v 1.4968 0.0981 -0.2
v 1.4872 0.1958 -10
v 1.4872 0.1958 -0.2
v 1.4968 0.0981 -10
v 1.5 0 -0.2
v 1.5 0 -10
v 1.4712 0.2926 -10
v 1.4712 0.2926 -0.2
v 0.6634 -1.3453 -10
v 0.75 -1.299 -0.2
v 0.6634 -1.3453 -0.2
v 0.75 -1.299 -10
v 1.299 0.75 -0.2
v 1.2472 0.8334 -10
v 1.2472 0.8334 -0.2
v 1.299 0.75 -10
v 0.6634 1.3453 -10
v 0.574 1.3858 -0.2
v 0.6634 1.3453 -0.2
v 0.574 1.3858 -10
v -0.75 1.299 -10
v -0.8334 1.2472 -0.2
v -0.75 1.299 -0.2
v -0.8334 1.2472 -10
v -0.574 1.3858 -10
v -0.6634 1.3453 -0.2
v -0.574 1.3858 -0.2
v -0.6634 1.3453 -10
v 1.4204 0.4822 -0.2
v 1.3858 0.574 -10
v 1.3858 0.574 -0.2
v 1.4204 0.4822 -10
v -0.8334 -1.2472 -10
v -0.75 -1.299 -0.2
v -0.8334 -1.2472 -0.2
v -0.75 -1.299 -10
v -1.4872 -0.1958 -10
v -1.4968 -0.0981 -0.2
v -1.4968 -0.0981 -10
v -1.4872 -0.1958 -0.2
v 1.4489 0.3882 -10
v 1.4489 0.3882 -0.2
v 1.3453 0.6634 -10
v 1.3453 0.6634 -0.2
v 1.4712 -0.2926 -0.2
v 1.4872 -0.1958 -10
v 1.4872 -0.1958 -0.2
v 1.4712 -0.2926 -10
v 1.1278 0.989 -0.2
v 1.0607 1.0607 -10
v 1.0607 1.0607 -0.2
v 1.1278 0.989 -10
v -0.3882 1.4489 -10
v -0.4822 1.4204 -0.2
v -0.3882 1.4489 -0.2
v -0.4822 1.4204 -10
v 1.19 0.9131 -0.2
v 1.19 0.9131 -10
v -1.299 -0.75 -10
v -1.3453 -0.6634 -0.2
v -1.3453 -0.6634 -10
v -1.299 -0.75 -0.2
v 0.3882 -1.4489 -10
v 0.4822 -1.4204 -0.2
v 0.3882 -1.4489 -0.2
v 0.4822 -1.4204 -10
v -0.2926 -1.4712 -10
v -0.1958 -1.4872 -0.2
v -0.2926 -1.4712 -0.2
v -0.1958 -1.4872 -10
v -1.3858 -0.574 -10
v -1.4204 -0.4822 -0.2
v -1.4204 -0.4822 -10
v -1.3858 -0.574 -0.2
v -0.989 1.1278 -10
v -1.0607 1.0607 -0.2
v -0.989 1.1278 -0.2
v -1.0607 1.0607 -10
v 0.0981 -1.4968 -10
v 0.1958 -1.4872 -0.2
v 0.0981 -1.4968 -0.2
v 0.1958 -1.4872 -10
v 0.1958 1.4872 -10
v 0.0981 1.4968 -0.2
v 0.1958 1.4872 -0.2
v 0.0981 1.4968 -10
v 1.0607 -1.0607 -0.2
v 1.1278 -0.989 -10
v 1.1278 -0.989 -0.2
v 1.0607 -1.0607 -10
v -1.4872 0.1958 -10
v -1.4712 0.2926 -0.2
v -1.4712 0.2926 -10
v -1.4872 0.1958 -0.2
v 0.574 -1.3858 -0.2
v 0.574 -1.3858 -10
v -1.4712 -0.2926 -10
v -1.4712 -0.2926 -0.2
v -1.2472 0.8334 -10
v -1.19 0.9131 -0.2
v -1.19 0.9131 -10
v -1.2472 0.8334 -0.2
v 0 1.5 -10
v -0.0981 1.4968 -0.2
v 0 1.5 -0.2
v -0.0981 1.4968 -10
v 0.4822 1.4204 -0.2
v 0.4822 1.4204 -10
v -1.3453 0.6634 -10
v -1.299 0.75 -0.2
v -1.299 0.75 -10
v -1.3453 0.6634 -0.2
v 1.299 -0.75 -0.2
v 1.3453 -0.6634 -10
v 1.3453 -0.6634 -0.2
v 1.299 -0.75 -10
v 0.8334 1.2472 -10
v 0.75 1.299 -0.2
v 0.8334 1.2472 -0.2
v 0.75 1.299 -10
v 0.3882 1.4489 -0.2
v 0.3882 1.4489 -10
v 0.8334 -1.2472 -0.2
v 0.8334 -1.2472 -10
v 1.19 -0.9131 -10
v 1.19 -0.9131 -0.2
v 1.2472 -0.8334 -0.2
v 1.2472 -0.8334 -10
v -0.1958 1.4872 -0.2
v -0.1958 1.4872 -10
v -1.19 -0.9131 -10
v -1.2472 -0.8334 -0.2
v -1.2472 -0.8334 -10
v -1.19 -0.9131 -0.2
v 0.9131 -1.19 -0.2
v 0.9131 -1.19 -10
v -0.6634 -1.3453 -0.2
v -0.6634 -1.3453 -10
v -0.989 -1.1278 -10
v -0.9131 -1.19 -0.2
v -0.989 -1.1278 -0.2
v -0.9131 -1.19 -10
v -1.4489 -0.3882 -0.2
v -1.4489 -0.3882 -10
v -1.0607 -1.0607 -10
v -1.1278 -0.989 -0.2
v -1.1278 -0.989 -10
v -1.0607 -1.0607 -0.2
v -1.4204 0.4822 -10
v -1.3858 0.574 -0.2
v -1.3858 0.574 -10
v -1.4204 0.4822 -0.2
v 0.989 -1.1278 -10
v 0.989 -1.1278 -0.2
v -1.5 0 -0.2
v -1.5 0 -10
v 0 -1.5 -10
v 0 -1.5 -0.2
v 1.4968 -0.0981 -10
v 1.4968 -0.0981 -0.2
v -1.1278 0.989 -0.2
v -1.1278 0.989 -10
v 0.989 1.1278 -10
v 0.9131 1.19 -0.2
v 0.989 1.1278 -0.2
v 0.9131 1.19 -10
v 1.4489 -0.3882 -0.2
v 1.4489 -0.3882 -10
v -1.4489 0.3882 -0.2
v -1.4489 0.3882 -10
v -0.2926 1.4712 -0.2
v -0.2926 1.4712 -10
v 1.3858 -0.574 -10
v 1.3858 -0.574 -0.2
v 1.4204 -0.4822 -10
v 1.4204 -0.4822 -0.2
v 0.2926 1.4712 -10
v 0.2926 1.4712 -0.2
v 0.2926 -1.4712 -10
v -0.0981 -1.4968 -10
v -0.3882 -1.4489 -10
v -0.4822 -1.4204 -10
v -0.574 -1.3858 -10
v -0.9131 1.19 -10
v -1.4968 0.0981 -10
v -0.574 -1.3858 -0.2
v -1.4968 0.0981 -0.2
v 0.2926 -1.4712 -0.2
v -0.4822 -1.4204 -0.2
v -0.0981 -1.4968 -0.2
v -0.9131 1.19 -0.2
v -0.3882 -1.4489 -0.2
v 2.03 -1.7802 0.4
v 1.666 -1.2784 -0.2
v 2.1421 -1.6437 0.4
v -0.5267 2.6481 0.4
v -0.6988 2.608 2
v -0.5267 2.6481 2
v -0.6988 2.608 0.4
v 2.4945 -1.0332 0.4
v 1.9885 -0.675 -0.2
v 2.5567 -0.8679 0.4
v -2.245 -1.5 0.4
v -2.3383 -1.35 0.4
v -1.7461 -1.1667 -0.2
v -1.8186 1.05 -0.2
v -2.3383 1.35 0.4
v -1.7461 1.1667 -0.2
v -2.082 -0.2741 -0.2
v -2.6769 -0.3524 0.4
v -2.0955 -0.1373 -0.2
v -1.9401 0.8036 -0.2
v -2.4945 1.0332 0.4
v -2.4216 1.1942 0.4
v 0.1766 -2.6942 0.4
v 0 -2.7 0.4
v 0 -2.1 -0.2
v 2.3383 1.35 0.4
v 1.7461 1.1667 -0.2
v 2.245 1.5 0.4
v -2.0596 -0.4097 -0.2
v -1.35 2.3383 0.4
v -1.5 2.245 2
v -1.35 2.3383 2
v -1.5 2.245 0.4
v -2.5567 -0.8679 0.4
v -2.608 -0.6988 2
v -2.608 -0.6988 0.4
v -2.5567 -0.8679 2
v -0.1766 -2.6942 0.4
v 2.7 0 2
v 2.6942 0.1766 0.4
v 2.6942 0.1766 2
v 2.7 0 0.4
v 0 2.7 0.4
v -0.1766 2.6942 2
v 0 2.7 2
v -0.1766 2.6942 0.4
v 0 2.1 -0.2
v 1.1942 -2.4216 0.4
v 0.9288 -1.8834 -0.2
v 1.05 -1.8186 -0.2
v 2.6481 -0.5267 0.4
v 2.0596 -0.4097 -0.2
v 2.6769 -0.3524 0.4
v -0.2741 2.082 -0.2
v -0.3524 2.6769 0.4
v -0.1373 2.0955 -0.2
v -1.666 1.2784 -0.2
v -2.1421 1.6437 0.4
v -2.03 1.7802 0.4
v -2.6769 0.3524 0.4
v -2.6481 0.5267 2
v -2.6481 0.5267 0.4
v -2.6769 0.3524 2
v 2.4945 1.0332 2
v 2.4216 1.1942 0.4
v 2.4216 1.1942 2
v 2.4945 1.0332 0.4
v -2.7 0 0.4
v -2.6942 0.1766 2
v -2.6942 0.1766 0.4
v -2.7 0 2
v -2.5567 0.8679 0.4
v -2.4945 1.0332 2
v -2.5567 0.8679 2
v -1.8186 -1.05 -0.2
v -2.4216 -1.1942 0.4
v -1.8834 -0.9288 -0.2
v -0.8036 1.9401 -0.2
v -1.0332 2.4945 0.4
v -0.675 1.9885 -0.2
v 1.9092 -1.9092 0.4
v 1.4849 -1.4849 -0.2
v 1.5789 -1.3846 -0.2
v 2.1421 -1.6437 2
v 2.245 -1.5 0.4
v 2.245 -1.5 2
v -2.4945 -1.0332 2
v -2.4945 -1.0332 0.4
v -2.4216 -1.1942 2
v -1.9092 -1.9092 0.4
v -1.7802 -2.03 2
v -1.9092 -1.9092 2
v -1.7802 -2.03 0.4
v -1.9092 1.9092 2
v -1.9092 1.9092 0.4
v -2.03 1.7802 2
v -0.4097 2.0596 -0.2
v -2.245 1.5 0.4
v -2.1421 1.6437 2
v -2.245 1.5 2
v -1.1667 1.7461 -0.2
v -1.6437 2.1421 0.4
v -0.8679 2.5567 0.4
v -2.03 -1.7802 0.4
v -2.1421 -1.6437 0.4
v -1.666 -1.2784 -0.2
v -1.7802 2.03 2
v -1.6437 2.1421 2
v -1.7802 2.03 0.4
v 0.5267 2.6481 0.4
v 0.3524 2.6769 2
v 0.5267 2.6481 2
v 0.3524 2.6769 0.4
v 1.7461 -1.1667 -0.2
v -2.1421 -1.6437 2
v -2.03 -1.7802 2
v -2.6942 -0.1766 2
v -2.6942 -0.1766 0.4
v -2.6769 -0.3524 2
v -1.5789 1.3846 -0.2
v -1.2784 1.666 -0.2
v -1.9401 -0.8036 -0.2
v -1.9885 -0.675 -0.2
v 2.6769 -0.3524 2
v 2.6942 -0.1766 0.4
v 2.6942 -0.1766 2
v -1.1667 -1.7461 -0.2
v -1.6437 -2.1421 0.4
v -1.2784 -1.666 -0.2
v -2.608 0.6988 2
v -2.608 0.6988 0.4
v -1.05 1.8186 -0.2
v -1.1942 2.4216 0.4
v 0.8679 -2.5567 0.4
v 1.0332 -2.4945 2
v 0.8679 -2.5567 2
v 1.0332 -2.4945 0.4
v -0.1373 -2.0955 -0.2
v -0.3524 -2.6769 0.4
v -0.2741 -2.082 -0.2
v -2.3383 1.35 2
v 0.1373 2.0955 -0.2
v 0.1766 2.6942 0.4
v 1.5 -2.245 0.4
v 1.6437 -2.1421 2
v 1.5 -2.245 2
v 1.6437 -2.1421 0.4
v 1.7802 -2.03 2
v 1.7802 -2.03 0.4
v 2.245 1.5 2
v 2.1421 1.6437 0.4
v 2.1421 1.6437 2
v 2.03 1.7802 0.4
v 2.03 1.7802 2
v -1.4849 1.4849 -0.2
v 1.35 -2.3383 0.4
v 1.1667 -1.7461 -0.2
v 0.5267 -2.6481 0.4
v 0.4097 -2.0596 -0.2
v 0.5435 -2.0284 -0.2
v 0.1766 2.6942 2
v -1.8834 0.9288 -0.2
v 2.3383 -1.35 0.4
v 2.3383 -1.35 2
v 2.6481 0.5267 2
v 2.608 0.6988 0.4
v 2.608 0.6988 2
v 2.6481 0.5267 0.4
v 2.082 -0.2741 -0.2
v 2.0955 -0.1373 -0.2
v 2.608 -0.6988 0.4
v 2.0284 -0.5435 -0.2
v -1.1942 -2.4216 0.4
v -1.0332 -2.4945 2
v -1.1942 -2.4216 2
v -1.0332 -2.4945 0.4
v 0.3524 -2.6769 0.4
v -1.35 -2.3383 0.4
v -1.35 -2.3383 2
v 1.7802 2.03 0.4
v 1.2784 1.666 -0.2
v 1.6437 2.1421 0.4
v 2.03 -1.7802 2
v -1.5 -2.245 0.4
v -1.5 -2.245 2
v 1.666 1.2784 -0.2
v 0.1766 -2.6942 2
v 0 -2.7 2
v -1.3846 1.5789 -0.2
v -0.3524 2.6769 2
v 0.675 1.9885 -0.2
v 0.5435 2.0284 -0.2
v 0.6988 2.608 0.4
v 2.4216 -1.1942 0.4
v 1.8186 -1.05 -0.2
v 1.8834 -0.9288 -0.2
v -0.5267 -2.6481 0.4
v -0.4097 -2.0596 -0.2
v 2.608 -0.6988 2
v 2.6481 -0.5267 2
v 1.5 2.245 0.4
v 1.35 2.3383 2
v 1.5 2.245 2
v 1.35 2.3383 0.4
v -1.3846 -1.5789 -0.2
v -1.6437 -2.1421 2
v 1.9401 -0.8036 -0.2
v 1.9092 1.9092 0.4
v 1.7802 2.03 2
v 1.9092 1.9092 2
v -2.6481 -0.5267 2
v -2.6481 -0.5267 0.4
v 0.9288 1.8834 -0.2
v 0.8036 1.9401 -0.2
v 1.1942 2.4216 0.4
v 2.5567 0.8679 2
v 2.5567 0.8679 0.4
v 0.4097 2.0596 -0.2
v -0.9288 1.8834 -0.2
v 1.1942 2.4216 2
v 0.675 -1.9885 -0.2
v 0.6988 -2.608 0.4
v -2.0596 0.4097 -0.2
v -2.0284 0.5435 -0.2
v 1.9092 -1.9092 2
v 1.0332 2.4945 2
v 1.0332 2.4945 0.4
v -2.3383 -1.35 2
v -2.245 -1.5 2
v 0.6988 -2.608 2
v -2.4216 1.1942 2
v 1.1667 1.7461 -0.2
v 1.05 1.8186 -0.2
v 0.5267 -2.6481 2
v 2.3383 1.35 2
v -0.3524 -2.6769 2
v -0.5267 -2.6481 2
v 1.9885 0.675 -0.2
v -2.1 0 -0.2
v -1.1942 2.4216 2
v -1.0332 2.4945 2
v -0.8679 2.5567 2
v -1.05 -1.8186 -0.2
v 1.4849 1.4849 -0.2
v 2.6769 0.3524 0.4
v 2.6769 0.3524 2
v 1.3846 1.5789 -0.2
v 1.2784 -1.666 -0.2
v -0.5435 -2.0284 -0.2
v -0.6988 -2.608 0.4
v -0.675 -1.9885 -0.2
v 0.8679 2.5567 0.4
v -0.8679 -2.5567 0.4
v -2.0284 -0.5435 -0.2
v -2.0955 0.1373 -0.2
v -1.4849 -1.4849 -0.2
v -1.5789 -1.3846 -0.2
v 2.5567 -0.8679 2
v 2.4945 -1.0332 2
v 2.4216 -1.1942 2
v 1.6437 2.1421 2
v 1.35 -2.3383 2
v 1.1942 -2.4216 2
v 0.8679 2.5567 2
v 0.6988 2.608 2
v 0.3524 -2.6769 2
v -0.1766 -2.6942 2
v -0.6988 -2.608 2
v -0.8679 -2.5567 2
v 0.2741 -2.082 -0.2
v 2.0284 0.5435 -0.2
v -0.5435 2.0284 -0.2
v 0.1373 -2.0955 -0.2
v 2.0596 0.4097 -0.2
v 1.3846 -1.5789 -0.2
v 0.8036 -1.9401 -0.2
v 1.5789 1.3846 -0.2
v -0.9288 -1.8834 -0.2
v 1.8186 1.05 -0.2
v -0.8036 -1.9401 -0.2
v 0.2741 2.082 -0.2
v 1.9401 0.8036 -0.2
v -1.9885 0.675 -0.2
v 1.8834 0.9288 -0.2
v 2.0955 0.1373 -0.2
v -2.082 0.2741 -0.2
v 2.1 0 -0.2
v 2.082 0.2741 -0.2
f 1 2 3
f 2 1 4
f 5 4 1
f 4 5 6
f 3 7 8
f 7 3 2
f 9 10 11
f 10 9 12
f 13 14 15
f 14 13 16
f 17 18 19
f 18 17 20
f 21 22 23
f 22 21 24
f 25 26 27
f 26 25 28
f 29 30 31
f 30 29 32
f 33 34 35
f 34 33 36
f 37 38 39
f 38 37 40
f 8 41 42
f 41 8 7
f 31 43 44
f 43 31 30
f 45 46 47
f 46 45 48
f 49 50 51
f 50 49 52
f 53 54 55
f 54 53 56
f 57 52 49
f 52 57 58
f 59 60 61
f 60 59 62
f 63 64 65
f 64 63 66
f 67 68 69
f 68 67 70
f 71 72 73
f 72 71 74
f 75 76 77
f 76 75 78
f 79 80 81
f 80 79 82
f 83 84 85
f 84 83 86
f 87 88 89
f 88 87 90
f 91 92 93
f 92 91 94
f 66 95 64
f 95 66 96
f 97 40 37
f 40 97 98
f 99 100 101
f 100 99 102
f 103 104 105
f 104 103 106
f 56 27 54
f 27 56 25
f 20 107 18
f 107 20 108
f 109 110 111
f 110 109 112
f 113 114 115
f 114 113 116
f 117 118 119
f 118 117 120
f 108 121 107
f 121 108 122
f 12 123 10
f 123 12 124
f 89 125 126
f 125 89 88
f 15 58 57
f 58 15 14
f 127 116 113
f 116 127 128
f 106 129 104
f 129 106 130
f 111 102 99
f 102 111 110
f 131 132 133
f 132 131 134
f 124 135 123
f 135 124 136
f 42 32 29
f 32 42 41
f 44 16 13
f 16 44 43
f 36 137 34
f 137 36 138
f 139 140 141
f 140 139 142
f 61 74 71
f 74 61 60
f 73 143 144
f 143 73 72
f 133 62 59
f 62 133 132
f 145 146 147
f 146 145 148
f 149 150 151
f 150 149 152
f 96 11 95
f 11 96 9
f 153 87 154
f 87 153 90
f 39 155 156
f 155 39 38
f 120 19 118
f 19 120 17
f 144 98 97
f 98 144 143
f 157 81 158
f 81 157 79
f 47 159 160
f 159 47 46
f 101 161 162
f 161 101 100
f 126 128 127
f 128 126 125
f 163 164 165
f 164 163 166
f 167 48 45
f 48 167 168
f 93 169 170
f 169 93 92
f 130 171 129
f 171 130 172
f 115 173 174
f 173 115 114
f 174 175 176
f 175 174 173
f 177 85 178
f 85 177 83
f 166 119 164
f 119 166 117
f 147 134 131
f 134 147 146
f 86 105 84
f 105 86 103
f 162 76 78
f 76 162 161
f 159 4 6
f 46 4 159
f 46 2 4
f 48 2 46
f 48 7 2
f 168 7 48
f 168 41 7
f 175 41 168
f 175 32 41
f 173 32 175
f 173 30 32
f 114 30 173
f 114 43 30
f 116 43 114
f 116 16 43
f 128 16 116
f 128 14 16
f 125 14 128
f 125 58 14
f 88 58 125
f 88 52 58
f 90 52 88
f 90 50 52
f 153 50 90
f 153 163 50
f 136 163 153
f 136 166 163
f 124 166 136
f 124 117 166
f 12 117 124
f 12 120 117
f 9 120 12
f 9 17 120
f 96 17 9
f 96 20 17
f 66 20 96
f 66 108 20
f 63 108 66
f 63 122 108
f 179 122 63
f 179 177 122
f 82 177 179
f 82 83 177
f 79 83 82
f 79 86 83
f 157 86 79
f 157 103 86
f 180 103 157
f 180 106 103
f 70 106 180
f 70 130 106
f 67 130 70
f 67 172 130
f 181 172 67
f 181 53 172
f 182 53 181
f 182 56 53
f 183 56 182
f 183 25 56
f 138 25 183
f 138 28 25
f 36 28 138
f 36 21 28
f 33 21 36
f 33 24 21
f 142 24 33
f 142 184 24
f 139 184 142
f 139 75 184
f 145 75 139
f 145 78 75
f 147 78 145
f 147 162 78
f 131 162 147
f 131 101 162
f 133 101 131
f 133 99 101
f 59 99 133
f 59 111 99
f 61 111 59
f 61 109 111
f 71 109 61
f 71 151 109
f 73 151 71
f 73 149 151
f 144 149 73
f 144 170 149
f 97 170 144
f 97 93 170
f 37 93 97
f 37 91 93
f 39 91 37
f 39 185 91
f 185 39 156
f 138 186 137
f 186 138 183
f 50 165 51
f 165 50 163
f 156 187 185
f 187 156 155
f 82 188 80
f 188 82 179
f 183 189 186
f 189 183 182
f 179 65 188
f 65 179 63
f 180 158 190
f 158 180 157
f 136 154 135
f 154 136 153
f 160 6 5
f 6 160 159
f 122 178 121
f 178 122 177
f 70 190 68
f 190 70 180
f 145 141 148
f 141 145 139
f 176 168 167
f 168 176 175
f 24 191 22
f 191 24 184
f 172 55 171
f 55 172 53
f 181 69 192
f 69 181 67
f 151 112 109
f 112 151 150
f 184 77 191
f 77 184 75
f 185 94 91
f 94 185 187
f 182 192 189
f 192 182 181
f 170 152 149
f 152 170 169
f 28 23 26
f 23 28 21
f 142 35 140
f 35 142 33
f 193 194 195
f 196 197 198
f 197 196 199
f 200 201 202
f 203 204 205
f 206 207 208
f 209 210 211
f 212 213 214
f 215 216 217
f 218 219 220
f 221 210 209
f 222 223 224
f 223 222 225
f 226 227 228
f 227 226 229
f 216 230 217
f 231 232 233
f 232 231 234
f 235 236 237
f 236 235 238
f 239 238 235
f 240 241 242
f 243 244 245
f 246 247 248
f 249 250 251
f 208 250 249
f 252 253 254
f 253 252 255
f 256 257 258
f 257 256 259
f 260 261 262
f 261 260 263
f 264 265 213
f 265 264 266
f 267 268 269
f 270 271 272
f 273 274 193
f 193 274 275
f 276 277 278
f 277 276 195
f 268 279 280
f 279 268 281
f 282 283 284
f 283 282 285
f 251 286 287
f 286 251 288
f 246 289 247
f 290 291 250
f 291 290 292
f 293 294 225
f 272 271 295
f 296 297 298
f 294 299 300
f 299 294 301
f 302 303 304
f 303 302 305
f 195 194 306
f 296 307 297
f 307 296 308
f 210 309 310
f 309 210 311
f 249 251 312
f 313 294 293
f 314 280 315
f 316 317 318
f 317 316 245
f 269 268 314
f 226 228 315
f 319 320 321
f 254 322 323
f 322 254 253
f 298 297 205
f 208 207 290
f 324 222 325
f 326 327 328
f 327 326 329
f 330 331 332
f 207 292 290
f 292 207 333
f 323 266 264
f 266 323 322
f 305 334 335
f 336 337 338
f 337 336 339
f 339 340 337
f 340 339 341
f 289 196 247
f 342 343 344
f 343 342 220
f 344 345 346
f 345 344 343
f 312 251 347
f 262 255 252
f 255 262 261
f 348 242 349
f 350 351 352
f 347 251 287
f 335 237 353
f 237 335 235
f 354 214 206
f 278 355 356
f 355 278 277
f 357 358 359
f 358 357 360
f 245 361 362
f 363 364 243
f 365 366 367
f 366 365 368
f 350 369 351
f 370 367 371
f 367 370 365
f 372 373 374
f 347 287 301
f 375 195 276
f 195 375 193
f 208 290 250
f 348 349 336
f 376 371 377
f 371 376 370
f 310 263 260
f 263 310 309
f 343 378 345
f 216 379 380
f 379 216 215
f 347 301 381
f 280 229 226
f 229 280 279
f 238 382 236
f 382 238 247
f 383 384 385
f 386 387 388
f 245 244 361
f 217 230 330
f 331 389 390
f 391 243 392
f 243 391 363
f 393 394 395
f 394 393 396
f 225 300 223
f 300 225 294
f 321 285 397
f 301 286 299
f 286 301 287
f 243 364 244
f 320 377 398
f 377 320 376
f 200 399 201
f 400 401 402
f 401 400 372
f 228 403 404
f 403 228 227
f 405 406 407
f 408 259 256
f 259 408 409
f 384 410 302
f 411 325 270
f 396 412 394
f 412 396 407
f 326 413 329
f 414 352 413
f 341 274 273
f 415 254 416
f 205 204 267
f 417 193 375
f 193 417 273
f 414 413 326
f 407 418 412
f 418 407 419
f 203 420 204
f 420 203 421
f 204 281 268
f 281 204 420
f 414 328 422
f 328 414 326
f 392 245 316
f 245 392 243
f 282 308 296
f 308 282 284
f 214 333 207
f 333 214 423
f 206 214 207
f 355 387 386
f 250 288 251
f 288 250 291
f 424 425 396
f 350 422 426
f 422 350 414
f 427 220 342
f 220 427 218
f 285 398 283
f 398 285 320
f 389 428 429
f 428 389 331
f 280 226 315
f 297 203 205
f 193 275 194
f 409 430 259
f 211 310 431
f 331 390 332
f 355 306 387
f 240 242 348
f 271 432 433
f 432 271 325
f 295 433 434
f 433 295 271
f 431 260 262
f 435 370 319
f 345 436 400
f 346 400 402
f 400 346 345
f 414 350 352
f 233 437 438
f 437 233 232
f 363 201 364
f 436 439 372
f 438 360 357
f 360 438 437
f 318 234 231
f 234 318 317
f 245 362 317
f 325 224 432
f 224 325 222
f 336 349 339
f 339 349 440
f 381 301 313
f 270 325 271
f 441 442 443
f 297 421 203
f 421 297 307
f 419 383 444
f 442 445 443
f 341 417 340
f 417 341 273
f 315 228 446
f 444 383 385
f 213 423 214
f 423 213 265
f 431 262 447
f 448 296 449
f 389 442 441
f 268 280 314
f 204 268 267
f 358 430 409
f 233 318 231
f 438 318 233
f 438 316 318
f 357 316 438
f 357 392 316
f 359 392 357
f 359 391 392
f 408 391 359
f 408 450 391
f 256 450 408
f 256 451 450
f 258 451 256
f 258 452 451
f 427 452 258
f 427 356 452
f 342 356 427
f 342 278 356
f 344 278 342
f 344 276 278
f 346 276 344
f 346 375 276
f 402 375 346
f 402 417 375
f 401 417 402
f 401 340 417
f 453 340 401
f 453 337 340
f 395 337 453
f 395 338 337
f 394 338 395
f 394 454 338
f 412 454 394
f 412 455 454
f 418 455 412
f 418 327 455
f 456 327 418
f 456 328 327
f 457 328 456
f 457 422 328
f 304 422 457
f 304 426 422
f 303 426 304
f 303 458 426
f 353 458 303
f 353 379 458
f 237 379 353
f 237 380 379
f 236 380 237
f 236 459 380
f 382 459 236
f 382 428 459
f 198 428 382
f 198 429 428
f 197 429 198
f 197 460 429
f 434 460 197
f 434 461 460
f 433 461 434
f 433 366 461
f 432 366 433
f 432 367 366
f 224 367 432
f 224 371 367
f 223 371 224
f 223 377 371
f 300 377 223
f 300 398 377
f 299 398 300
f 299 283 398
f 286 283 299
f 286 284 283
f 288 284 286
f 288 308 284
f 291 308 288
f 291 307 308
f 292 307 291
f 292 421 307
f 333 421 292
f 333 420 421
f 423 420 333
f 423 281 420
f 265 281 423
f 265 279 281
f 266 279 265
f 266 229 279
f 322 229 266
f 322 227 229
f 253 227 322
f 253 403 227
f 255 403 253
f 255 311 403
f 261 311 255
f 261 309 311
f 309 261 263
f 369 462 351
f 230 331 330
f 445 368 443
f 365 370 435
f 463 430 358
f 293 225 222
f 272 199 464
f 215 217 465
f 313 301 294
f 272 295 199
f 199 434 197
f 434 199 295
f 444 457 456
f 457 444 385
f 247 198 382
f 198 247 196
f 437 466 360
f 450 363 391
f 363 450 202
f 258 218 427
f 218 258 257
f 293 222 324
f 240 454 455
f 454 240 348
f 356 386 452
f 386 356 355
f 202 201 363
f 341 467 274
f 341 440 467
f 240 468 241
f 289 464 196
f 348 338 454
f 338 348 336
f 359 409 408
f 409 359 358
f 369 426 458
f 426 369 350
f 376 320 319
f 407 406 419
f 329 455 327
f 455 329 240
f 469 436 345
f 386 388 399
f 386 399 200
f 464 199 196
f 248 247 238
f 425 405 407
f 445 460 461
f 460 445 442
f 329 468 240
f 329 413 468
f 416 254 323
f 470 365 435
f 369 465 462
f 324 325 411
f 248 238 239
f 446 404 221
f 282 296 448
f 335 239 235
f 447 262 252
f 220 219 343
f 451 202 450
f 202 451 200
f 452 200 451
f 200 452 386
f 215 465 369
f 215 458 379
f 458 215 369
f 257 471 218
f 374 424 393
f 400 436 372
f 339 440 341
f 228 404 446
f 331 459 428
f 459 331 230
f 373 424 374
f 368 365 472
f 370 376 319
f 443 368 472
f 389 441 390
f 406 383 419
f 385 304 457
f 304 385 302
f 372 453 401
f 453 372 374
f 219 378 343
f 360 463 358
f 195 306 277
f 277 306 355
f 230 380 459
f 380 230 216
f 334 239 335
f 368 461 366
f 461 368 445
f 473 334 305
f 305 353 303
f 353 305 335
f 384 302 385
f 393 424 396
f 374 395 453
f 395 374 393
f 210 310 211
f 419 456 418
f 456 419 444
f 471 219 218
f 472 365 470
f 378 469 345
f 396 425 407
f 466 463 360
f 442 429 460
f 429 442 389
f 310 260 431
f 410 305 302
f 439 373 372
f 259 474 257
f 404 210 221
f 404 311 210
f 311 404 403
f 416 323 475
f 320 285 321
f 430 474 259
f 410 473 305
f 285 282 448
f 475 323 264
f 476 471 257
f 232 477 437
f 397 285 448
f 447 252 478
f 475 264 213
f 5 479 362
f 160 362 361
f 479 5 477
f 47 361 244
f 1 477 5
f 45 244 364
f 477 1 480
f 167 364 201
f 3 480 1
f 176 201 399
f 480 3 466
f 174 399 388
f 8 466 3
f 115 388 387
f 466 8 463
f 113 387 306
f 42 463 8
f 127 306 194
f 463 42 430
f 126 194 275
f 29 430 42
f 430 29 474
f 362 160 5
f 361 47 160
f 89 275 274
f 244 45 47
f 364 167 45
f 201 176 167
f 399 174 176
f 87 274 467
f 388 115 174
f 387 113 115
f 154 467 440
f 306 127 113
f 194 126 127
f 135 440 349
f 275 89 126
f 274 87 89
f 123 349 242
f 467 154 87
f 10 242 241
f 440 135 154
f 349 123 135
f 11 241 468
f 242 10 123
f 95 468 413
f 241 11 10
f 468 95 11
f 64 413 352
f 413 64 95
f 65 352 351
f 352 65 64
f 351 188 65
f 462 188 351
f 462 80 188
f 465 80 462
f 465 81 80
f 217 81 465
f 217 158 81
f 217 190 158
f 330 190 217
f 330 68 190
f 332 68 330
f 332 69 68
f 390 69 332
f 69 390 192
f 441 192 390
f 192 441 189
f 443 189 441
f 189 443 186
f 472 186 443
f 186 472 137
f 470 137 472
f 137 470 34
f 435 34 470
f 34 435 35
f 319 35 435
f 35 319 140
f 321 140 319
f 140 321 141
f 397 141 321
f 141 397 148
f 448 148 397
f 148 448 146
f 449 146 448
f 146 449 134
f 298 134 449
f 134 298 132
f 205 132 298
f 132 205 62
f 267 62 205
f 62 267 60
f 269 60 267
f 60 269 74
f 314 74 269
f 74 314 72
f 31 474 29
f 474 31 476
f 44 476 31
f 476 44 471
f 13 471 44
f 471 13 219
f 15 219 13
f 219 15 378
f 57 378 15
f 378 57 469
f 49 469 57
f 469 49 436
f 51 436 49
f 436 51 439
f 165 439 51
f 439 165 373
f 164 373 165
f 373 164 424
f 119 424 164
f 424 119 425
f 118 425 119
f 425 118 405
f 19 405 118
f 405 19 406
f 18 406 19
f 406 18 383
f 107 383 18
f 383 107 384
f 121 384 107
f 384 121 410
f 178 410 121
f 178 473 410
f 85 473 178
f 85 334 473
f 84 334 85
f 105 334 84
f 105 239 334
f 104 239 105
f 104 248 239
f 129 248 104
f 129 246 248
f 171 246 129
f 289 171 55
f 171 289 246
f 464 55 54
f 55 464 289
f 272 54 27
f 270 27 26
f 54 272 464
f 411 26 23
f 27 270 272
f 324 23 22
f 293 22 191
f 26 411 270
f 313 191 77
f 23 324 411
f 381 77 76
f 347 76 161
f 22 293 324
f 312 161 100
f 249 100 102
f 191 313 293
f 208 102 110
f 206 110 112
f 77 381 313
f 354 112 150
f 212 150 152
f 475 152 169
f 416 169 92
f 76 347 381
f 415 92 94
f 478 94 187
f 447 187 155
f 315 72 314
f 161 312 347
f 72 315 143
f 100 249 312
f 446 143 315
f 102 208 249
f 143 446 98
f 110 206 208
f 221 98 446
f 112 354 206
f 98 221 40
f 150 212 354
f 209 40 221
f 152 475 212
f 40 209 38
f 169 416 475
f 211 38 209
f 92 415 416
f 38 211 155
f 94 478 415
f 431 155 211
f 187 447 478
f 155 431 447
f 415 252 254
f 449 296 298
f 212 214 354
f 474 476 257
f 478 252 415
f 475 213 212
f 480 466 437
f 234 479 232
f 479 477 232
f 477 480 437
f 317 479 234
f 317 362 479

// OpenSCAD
// M3x10 Pan Head Screw (single connected solid)

// Parameters (mm)
shaft_diameter_mm = 3.0;   // shank diameter
length_mm         = 10.0;  // under-head length
head_diameter_mm  = 5.4;   // head max diameter
head_height_mm    = 2.0;   // head height
overlap_mm        = 0.2;   // small overlap to guarantee watertight union
head_fillet_mm    = 0.6;   // pan-head edge rounding control

$fn = 96;

module pan_head_screw(
    d_shank = shaft_diameter_mm,
    L       = length_mm,
    d_head  = head_diameter_mm,
    h_head  = head_height_mm,
    fillet  = head_fillet_mm,
    ov      = overlap_mm
){
    r_shank = d_shank/2;
    r_head  = d_head/2;

    // Keep fillet within bounds
    fillet_r = min(fillet, r_head - r_shank);
    fillet_z = min(fillet, h_head);

    union() {
        // Shank: from z=0 down to z=-L
        translate([0,0,-L/2])
            cylinder(r=r_shank, h=L, center=true);

        // Pan head: from z=0 up to z=h_head, overlapping into shank by ov
        translate([0,0,-ov])
            rotate_extrude()
                polygon(points=[
                    [0, 0],
                    [r_head - fillet_r, 0],
                    [r_head, fillet_z],
                    [r_head, h_head + ov],
                    [0, h_head + ov]
                ]);
    }
}

pan_head_screw();
